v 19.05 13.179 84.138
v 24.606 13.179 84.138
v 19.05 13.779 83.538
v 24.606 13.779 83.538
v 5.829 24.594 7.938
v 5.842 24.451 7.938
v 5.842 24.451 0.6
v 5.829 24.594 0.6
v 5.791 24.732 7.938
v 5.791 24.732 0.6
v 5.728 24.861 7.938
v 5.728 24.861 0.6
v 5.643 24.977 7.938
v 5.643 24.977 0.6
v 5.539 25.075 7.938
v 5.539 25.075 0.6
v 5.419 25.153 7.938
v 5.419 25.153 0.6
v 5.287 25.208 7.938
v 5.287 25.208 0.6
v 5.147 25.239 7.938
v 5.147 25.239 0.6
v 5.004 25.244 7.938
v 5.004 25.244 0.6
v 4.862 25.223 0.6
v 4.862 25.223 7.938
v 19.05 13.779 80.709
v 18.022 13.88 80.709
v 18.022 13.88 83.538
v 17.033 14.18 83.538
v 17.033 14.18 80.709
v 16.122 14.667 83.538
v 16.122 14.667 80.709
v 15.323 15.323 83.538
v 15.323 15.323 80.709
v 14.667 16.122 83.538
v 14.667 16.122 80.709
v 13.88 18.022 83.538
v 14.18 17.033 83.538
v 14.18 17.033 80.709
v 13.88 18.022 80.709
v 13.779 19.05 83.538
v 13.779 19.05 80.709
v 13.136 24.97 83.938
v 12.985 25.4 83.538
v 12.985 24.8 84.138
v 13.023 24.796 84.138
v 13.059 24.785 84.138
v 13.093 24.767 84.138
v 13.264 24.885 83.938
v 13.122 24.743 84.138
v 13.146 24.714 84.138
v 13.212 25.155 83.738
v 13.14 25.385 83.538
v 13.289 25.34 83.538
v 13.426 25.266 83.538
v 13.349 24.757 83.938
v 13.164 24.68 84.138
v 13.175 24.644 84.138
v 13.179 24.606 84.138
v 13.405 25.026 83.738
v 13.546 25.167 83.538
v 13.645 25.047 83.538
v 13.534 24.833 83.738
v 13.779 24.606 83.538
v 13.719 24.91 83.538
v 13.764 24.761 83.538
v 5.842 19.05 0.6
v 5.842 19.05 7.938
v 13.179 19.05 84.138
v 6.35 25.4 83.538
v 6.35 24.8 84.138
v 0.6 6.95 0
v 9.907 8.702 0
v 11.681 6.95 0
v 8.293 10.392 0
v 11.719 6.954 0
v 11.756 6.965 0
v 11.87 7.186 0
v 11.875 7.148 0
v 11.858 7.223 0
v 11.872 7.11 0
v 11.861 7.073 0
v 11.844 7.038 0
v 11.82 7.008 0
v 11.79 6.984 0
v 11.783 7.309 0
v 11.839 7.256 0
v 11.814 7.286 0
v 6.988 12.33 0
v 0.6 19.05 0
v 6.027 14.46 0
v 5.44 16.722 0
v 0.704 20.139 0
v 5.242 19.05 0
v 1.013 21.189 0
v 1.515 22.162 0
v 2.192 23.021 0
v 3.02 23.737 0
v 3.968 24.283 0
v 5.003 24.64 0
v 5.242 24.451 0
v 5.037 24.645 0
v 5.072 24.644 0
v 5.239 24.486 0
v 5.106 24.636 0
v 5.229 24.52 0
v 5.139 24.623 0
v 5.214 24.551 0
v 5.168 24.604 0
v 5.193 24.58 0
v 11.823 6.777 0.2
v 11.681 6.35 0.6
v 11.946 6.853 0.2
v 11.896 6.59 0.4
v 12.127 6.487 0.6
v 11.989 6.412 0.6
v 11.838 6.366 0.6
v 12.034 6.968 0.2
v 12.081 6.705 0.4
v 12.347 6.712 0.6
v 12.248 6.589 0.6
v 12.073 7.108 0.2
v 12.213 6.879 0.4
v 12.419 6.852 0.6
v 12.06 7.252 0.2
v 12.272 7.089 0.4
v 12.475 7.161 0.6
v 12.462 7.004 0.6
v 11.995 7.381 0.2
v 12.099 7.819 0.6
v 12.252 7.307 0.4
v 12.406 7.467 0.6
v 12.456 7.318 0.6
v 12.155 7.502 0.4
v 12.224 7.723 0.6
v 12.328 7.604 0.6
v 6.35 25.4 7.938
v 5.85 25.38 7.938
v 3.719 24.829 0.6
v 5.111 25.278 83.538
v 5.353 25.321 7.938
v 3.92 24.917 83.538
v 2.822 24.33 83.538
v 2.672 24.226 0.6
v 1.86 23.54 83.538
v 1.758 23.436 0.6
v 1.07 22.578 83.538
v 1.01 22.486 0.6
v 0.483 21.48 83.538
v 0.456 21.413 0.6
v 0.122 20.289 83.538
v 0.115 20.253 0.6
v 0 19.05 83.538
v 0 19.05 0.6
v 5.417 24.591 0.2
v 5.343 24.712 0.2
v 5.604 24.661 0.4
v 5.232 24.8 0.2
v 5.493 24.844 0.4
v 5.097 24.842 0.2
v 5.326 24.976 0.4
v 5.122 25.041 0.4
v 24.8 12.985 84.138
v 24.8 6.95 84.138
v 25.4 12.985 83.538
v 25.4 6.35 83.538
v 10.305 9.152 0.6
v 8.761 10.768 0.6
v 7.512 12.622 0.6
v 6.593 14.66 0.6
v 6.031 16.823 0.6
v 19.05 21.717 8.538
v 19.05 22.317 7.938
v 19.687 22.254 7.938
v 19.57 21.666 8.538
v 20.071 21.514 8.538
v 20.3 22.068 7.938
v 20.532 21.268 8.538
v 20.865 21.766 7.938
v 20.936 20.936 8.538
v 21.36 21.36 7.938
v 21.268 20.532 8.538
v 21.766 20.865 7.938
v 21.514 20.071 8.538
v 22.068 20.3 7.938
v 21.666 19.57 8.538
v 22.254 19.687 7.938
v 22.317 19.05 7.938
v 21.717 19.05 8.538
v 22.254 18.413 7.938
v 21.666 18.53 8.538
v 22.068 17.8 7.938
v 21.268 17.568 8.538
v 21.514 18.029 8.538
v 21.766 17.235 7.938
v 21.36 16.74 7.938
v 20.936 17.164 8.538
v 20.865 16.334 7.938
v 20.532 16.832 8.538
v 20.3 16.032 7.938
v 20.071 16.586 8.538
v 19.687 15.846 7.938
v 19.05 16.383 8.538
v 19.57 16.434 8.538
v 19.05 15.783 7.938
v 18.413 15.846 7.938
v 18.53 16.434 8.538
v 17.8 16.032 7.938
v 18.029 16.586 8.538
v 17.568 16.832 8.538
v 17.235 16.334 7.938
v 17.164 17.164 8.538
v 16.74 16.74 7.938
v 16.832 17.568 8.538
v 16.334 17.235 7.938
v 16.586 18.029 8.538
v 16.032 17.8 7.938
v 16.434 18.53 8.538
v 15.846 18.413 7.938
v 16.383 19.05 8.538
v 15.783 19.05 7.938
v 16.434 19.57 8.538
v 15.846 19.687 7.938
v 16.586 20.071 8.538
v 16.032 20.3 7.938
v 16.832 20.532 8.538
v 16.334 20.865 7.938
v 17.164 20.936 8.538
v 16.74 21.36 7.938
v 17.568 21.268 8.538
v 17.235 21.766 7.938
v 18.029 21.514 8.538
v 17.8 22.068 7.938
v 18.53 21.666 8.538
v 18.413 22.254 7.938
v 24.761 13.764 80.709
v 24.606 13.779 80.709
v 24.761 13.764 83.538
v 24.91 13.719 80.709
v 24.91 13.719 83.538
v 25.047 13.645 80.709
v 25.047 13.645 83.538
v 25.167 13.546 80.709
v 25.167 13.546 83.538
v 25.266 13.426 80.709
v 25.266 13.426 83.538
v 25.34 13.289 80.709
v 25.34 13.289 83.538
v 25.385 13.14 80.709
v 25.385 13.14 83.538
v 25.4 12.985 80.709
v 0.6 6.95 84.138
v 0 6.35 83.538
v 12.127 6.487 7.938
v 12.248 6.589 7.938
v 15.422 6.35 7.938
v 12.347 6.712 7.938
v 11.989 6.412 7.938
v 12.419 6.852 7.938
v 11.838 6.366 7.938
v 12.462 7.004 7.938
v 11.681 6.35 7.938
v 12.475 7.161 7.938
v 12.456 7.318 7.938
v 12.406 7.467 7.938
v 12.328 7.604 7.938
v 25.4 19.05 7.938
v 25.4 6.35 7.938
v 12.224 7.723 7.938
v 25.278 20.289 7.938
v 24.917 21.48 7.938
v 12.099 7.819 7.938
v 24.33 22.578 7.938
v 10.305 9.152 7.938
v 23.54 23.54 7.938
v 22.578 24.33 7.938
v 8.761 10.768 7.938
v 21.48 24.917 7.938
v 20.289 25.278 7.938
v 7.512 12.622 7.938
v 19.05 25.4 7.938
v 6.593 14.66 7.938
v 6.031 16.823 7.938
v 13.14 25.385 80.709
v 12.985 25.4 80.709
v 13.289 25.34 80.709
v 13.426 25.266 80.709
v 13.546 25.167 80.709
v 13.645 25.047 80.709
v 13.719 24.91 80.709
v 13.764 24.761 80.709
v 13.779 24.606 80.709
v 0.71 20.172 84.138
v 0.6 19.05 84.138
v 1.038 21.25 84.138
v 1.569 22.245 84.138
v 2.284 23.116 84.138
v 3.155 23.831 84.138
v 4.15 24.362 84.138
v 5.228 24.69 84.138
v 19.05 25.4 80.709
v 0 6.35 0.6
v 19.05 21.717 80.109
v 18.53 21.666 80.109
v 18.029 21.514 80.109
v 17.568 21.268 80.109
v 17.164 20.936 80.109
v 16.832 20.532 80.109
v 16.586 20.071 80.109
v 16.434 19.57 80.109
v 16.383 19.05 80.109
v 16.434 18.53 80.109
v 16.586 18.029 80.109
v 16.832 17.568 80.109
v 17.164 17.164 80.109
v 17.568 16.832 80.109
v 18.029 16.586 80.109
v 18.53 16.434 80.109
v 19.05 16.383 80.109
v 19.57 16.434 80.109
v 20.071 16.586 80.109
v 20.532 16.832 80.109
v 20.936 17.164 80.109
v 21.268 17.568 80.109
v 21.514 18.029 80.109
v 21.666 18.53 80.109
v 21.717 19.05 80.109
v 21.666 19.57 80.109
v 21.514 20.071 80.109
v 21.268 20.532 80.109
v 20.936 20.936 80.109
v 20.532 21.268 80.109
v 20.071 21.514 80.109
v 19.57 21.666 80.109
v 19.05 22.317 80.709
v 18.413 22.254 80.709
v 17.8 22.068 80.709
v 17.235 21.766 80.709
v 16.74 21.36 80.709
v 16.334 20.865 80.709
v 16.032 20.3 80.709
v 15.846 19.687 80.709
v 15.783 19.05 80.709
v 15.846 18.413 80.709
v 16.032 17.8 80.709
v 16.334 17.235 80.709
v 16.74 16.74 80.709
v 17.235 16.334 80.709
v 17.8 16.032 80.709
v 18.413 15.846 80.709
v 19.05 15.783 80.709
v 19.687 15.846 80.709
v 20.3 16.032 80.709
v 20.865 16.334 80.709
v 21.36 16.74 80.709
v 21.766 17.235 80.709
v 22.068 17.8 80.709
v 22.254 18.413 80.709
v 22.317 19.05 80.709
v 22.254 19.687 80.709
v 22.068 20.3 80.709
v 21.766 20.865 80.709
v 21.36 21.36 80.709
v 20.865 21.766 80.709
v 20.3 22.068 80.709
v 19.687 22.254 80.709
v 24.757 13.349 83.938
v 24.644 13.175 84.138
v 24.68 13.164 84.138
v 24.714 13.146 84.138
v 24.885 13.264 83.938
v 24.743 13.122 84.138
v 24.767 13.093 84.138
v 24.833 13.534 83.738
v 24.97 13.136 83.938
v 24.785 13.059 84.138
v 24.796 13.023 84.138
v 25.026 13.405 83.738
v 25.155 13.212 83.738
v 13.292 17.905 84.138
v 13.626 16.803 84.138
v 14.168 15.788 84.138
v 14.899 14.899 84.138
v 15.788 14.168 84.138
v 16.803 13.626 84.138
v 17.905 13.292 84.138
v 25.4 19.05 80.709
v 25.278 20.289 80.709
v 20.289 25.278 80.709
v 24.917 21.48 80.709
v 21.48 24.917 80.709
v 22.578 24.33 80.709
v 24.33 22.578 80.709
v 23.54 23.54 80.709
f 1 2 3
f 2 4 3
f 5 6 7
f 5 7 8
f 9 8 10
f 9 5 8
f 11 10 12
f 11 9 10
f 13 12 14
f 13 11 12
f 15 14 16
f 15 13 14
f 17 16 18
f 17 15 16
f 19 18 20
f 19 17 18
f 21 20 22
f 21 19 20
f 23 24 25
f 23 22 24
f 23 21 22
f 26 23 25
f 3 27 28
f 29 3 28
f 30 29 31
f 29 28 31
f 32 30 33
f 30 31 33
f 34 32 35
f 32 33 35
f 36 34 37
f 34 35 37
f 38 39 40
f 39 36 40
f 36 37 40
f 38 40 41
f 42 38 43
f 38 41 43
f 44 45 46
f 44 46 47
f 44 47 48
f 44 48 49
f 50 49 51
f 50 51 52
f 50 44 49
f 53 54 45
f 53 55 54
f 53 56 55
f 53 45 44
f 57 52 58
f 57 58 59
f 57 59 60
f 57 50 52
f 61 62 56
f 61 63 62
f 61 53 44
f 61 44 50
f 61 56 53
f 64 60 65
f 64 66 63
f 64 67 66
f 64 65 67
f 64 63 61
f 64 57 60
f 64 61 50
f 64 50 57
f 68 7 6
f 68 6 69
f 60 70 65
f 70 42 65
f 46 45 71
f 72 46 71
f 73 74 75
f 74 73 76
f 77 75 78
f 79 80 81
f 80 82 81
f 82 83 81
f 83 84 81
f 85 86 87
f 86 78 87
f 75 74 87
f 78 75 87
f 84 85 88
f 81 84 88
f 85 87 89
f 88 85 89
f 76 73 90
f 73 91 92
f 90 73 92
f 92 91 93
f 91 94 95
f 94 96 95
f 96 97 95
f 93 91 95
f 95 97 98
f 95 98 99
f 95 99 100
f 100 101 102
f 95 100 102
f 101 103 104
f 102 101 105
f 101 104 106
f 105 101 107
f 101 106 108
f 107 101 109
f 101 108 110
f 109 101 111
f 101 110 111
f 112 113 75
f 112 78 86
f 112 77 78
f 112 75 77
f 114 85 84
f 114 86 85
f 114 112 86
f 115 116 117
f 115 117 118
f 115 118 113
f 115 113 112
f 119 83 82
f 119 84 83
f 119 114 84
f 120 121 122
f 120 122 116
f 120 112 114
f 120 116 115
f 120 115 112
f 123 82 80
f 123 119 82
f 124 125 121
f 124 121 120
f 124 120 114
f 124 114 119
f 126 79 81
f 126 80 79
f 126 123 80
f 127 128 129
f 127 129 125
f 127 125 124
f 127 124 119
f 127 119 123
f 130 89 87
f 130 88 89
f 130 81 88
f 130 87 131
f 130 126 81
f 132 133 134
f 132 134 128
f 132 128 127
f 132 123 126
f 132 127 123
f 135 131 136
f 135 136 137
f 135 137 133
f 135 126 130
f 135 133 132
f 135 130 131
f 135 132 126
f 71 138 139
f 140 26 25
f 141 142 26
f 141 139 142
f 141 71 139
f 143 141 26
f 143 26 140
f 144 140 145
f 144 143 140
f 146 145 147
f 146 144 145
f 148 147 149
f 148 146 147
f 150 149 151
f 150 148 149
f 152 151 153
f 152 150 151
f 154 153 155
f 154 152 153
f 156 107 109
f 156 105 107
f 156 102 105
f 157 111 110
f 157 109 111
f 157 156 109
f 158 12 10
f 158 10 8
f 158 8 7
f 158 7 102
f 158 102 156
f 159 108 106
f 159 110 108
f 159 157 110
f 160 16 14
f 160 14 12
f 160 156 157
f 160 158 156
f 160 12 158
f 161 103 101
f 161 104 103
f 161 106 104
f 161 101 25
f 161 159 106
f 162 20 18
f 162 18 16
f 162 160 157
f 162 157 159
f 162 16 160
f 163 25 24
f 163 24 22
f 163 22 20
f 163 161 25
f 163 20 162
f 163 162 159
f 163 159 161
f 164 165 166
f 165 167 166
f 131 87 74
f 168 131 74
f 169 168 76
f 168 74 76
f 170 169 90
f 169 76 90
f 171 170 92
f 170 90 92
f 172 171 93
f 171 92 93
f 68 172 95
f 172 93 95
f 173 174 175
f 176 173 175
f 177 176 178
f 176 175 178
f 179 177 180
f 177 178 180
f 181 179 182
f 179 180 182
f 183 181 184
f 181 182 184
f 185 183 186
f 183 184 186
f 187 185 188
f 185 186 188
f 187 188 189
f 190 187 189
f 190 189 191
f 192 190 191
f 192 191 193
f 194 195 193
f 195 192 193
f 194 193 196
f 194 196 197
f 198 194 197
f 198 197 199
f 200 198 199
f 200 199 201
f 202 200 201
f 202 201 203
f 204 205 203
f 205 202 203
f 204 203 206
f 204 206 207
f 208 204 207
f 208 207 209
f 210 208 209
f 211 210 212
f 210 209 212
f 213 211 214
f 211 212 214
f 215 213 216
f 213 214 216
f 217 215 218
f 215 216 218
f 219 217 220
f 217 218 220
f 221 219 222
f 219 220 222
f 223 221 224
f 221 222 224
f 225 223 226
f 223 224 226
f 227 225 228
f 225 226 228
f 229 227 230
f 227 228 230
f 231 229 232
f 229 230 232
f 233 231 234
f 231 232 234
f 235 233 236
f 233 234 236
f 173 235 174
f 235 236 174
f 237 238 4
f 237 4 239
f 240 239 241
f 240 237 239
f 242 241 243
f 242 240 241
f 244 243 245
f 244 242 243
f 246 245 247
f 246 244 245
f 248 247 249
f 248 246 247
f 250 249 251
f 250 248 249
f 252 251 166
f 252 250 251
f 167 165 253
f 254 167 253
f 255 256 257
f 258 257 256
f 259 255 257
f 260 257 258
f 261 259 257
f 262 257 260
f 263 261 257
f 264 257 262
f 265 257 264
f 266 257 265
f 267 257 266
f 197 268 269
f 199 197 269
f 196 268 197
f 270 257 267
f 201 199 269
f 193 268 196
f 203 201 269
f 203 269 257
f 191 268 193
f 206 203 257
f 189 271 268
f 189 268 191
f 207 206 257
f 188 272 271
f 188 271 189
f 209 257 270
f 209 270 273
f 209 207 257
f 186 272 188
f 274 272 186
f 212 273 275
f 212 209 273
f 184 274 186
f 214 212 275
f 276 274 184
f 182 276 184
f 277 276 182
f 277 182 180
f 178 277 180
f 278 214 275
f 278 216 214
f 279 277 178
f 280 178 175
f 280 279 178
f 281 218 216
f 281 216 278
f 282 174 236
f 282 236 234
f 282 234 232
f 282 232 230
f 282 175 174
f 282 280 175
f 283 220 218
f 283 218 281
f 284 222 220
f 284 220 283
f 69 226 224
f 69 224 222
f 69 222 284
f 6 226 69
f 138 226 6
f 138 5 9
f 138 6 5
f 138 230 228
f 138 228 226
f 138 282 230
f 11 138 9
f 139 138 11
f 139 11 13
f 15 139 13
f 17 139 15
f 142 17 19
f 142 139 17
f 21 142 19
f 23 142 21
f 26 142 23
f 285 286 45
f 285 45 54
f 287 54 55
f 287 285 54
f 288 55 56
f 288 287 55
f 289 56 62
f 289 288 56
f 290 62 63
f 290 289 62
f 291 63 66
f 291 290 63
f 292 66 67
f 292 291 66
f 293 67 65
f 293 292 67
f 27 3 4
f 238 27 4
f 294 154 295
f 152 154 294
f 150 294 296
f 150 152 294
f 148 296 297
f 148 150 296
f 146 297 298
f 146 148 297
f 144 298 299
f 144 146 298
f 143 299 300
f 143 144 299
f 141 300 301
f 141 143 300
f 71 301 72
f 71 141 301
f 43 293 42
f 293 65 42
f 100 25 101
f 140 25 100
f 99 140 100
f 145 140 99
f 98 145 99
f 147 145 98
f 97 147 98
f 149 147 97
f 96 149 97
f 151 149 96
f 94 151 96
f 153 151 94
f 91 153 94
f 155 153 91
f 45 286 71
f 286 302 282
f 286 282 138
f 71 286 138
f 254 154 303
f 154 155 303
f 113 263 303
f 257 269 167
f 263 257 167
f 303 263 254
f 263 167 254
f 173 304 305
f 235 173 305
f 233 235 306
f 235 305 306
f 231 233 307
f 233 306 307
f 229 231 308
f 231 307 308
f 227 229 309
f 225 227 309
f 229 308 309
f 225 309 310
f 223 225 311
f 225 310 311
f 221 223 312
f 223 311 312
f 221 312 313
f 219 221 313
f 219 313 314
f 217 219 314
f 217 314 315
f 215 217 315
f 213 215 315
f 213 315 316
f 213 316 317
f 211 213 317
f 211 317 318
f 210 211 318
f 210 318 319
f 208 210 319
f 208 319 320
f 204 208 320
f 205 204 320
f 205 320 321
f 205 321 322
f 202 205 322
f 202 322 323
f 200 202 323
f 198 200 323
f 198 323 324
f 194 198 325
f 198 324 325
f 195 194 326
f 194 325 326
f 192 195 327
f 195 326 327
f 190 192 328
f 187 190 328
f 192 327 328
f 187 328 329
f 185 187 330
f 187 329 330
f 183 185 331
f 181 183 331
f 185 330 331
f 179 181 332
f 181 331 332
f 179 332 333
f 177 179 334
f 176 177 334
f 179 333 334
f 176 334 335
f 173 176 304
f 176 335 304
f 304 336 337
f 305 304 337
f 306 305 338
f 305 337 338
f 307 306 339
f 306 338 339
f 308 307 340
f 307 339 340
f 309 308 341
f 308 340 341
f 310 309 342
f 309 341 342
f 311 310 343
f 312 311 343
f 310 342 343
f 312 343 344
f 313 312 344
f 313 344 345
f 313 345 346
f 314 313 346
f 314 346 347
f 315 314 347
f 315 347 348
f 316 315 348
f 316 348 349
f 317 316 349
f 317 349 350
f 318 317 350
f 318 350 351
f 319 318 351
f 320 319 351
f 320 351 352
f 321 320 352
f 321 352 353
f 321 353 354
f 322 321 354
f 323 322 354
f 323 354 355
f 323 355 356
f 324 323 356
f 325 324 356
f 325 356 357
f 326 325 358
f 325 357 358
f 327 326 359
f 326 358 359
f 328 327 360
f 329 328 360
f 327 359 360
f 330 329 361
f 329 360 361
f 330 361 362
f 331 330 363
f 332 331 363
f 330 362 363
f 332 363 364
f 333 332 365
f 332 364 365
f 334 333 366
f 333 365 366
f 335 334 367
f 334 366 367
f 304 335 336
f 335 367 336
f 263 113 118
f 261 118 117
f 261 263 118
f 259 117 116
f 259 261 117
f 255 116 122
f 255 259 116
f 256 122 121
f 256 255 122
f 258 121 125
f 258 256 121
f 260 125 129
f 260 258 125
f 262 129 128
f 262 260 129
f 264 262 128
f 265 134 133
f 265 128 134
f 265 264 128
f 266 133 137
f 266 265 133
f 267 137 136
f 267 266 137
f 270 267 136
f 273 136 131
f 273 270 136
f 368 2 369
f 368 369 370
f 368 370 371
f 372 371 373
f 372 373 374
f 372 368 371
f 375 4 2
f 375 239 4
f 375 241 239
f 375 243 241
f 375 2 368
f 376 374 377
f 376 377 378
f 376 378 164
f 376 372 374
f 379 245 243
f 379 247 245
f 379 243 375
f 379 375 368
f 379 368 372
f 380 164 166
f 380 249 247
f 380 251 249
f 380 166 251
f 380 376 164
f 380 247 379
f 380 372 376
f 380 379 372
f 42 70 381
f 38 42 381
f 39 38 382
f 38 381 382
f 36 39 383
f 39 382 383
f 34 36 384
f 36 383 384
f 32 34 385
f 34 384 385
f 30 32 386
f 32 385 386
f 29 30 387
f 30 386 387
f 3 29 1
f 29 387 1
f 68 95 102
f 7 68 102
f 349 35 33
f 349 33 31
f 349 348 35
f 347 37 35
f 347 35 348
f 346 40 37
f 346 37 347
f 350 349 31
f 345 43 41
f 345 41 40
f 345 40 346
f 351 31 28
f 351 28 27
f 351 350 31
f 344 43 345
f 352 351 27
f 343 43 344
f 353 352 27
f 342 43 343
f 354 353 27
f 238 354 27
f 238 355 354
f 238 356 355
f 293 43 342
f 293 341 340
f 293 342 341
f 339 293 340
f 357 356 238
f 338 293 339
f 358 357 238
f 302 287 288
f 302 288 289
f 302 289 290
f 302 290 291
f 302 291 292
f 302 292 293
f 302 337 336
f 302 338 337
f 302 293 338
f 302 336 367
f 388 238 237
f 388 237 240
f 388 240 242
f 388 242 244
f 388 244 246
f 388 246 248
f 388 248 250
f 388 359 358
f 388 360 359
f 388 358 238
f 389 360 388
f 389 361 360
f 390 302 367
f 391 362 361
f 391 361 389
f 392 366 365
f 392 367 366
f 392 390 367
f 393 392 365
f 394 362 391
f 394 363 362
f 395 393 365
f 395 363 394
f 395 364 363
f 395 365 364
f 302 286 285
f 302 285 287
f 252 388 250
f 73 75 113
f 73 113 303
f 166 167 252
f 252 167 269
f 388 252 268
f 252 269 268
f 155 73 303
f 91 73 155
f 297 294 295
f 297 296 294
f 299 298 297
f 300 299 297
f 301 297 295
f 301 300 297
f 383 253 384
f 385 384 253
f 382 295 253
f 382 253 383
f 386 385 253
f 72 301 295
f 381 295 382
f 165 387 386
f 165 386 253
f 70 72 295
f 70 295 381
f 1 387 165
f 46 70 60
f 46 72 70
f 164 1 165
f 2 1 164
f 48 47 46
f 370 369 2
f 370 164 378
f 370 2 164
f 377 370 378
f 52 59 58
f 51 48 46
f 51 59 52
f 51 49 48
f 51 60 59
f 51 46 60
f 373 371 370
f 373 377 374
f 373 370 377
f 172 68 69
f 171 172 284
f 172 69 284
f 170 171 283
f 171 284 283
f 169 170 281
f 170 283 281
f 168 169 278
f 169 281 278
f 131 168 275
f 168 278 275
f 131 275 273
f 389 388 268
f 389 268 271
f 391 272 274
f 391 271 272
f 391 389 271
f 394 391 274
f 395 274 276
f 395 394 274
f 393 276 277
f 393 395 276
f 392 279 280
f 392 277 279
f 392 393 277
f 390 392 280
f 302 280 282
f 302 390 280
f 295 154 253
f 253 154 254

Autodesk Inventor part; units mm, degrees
ref_plane "YZ Plane" through (0, 0, 0) normal (1, 0, 0) x (0, 1, 0)
ref_plane "XZ Plane" through (0, 0, 0) normal (0, 1, 0) x (-1, 0, 0)
ref_plane "XY Plane" through (0, 0, 0) normal (0, 0, 1) x (1, 0, 0)
sketch "Sketch1" plane through (0, 0, 0) normal (0, 0, 1) x (1, 0, 0)
  line L0 (0, 0) -> (25.4, 0)
  line L1 (25.4, 0) -> (25.4, 25.4)
  line L2 (25.4, 25.4) -> (0, 25.4)
  line L3 (0, 25.4) -> (0, 0)
  dimension "d0" = 25.4
  dimension "d1" = 25.4
extrude "Extrusion1" add sketch "Sketch1" along normal blind 84.138
sketch "Sketch2" plane through (0, 0, 84.138) normal (0, 0, 1) x (1, 0, 0)
  line L0 (25.4, 25.4) -> (0, 25.4) projected
  line L1 (25.4, 25.4) -> (13.779, 25.4)
  line L2 (13.779, 25.4) -> (13.779, 13.779)
  line L3 (13.779, 13.779) -> (25.4, 13.779)
  line L4 (25.4, 13.779) -> (25.4, 25.4)
  point P0 (0, 0)
  dimension "d4" = 11.621
  dimension "d5" = 11.621
extrude "Extrusion2" cut sketch "Sketch2" against normal blind 3.429
sketch "Sketch3" plane through (0, 0, 0) normal (0, 0, -1) x (-1, 0, 0)
  line L0 (-25.4, 25.4) -> (-25.4, 13.779) projected
  line L1 (-25.4, 25.4) -> (-5.842, 25.4)
  line L2 (-5.842, 25.4) -> (-5.842, 5.842)
  line L3 (-5.842, 5.842) -> (-25.4, 5.842)
  line L4 (-25.4, 5.842) -> (-25.4, 25.4)
  point P0 (0, 0)
  dimension "d8" = 19.558
  dimension "d9" = 19.558
extrude "Extrusion3" cut sketch "Sketch3" against normal blind 7.938
sketch "Sketch4" plane through (0, 0, 7.938) normal (0, 0, -1) x (-1, 0, 0)
  line L0 (-25.4, 25.4) -> (-5.842, 25.4) projected
  line L1 (-25.4, 5.842) -> (-25.4, 25.4) projected
  point P0 (0, 0)
  point P1 (-19.05, 19.05)
  dimension "d12" = 6.35
  dimension "d13" = 6.35
hole "Hole1" at (19.05, 19.05, 7.938) direction (0, 0, 1) diameter 5.334 end through all clearance for "Flat Head Machine Screw (82)" size "#10" standard "Ansi Unified Screw Threads"
fillet "Fillet1" radius 6.35 4 edges at (0, 25.4, 42.069) (25.4, 25.4, 44.3235) (0, 0, 42.069) (25.4, 0, 42.069)
fillet "Fillet2" radius 0.794 4 edges at (25.3796, 5.842, 3.969) (5.842, 25.3796, 3.969) (25.4, 13.779, 82.4235) (13.779, 25.4, 82.4235)
fillet "Fillet3" radius 5.271 1 edges at (13.779, 13.779, 82.4235)
fillet "Fillet4" radius 13.208 1 edges at (5.842, 5.842, 3.969)
chamfer "Chamfer1" distance 0.6 angle 45 24 edges at (19.05, 16.383, 7.938) (9.7105, 9.7105, 0) (5.842, 21.7506, 0) (5.5393, 25.0751, 0) (1.3614, 22.9789, 0) (0, 12.7, 0) (1.8599, 1.8599, 0) (12.7, 0, 0) (22.9789, 1.3614, 0) (25.0751, 5.5393, 0) (21.7506, 5.842, 0) (19.05, 16.383, 80.709) (21.828, 13.779, 84.138) (15.3228, 15.3228, 84.138) (13.779, 21.828, 84.138) (13.5464, 25.1674, 84.138) (9.6675, 25.4, 84.138) (1.8599, 23.5401, 84.138) (0, 12.7, 84.138) (1.8599, 1.8599, 84.138) (12.7, 0, 84.138) (23.5401, 1.8599, 84.138) (25.4, 9.6675, 84.138) (25.1674, 13.5464, 84.138)
sketch "Sketch5" plane through (0, 0, 84.138) normal (0, 0, 1) x (1, 0, 0)
  line L0 (0, 0) -> (25.4, 0)
  line L1 (25.4, 0) -> (25.4, 6.35)
  line L2 (25.4, 6.35) -> (0, 6.35)
  line L3 (0, 6.35) -> (0, 0)
  dimension "d28" = 6.35
  dimension "d29" = 25.4
extrude "Extrusion4" cut sketch "Sketch5" against normal through all
fillet "Fillet5" radius 0.794 1 edges at (15.4222, 6.35, 4.269)
chamfer "Chamfer2" distance 0.6 angle 45 3 edges at (6.1405, 6.35, 0) (12.1586, 6.5098, 0) (12.7, 6.35, 84.138)
equation "\"d5\" = d4"
equation "\"d9\" = d8"
equation "\"d13\" = d12"
properties part number "Corner-001B" material "PC/ABS Plastic"
